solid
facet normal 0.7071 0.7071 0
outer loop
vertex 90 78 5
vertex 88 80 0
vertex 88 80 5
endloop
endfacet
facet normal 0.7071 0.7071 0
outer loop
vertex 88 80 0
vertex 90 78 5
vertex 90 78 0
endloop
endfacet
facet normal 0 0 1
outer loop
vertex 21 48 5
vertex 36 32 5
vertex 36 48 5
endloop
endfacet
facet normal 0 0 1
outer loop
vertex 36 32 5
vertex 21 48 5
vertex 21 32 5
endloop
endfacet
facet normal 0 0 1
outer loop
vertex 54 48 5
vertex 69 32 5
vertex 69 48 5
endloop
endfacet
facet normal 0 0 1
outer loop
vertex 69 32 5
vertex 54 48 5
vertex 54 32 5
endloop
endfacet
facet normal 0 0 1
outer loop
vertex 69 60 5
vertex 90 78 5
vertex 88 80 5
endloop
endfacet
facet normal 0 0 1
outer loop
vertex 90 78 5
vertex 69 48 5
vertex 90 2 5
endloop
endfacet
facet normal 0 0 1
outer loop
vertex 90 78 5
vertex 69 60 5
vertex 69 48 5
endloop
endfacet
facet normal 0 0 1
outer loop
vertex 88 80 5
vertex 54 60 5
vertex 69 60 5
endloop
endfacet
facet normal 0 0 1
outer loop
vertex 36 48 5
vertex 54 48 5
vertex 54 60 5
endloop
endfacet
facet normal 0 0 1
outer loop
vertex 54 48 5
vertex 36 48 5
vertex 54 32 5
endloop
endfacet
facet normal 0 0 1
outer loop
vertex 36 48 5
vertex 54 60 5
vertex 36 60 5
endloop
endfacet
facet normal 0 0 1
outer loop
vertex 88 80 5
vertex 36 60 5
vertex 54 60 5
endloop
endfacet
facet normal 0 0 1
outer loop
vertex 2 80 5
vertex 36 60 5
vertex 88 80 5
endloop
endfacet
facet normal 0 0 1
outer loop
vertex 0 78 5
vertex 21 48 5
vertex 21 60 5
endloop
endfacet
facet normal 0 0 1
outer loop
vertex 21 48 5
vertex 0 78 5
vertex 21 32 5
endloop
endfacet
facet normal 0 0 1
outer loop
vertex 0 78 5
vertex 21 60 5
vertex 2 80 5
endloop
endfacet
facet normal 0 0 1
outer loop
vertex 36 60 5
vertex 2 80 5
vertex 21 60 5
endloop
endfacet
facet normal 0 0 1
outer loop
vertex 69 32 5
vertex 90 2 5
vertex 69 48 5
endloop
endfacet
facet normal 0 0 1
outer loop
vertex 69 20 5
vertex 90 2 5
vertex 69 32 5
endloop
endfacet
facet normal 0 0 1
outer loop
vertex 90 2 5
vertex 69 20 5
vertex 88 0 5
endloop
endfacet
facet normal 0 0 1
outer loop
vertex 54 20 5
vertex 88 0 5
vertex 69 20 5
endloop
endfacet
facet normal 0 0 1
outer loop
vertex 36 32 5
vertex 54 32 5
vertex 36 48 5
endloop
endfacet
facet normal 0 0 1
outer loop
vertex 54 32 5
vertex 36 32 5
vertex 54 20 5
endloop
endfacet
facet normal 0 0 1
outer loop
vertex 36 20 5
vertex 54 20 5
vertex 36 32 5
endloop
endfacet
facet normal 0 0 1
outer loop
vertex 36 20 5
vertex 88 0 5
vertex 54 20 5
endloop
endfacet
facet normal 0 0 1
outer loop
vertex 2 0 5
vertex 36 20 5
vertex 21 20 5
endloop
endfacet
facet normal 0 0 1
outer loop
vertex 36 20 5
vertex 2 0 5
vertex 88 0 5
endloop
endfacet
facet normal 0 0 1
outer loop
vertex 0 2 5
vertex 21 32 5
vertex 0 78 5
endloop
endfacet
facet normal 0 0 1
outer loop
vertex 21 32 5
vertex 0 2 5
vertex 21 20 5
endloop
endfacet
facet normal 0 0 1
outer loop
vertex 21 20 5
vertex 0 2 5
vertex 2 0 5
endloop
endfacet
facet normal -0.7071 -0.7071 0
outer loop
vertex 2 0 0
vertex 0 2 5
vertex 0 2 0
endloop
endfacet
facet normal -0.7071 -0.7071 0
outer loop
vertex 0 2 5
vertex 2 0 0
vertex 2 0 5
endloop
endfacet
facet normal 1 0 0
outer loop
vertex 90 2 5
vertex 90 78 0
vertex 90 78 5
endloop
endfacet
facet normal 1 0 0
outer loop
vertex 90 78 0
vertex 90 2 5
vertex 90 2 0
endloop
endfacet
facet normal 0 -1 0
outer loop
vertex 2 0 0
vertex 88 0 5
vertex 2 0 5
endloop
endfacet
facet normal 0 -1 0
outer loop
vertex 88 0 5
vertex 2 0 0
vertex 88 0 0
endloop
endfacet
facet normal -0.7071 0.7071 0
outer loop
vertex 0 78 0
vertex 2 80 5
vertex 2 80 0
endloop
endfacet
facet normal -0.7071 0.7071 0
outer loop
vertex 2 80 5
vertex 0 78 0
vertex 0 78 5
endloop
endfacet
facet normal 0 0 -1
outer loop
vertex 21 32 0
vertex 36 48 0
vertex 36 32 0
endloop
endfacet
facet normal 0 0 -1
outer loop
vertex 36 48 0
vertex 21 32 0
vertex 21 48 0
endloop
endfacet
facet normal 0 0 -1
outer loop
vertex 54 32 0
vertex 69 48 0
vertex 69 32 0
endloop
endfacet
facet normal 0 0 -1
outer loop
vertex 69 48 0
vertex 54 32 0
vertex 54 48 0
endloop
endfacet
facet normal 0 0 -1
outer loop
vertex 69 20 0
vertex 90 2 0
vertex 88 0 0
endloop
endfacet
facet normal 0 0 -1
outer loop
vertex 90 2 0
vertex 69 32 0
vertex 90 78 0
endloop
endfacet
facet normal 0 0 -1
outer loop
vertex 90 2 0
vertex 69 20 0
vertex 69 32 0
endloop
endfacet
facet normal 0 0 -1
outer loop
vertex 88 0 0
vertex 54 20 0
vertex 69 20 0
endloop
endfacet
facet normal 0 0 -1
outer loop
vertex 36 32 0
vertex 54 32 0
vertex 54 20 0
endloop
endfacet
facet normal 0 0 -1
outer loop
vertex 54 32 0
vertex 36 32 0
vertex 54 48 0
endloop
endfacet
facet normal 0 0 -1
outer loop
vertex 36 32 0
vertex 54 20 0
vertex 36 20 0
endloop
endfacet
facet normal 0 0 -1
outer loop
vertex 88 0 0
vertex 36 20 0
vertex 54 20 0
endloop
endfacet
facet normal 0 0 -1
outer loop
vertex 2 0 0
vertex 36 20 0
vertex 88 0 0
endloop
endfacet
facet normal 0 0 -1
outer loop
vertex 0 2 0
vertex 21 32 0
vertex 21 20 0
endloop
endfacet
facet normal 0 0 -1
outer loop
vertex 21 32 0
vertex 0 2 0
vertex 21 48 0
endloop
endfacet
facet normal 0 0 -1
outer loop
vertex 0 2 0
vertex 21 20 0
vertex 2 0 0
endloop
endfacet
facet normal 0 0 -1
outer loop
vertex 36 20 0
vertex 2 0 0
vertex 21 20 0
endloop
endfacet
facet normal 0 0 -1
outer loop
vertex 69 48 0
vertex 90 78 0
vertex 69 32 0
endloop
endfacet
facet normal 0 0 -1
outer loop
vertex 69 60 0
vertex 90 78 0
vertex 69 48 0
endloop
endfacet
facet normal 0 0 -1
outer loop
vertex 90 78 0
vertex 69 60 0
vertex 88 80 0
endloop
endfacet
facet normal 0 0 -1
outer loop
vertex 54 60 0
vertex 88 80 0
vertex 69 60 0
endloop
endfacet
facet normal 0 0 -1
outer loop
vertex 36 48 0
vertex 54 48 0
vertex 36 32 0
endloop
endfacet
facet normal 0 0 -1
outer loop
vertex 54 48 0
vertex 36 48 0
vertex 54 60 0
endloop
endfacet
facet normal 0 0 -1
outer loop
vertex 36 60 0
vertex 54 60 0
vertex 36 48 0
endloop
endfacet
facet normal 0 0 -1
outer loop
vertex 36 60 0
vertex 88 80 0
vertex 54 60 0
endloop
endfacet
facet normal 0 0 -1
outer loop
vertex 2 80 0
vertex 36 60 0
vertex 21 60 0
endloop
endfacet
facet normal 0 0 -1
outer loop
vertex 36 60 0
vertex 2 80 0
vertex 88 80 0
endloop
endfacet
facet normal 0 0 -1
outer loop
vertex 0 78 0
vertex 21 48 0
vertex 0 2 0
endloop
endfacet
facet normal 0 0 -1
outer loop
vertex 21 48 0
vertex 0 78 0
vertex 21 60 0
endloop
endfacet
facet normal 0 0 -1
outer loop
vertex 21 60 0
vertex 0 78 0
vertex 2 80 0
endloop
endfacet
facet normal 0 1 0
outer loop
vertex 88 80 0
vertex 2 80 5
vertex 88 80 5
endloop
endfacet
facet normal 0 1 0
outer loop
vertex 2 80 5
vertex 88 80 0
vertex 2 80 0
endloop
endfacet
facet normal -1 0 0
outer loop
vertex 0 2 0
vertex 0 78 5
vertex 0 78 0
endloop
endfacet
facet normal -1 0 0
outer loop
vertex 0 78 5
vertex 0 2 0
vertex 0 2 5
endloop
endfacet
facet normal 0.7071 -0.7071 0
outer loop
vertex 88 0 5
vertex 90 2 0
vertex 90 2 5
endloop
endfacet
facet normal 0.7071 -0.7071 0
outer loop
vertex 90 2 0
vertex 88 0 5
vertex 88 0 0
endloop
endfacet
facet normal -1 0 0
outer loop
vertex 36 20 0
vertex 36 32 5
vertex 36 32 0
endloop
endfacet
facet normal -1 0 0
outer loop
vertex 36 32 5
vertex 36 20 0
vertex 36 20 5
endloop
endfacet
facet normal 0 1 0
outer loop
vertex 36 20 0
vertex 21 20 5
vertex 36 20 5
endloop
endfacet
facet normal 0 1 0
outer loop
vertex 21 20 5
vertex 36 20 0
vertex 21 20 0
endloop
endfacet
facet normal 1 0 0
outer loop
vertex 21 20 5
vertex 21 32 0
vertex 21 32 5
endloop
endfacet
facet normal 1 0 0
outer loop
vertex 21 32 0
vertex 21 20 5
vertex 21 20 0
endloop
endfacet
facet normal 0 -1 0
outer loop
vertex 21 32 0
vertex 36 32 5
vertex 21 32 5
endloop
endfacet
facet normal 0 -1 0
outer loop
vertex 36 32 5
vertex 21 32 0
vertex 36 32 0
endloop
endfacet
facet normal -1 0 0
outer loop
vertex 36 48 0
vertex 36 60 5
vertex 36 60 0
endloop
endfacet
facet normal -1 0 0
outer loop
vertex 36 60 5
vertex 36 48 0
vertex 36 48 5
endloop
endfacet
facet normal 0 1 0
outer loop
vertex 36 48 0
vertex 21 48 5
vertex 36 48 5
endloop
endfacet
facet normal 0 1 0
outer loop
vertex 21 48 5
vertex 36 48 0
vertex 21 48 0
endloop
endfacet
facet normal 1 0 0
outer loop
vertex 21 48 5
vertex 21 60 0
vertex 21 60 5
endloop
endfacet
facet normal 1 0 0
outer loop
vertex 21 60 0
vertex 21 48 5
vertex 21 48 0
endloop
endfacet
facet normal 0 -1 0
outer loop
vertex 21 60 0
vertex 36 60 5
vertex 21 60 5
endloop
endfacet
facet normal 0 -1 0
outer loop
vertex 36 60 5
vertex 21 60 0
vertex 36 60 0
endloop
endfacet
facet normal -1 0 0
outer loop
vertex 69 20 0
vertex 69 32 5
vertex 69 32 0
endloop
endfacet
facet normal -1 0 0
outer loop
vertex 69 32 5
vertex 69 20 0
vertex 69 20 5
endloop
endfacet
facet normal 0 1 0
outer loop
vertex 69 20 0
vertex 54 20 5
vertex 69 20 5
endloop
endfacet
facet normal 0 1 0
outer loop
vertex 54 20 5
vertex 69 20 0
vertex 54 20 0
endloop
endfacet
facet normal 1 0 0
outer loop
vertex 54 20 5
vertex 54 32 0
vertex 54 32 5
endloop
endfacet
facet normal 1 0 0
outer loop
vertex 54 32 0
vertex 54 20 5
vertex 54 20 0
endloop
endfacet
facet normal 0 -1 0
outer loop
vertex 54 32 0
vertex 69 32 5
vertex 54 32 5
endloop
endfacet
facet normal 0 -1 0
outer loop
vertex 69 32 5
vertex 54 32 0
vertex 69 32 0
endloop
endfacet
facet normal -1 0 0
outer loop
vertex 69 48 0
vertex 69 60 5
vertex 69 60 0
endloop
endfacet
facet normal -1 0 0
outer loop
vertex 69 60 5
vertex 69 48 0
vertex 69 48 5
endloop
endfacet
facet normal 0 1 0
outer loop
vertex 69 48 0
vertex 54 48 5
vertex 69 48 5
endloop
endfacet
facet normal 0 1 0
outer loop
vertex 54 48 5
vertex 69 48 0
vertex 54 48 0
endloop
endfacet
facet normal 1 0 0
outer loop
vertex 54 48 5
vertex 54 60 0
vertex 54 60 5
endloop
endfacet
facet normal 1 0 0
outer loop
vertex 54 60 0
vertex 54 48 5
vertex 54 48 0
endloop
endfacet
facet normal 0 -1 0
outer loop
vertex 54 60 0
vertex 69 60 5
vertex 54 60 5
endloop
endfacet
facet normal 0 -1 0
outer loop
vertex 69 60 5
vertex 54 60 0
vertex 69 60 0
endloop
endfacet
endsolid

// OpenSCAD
$fn = 32;

// ----------------------------------------------------------------------
// Windowed plate: 4 voids, 90 x 80 x 5 mm
// ----------------------------------------------------------------------

// --- parameters (mm) ---
plate_l = 90;             // plate length, X
plate_w = 80;             // plate width, Y
plate_t = 5;              // plate thickness, Z
edge_margin = 12;         // wall from the plate edge to any window
win_l = 15;               // pocket length
win_w = 12;               // pocket width
pitch_x = 33;             // grid pitch along X
pitch_y = 28;             // grid pitch along Y
depth_1 = 5;              // depth of void 1 (full thickness = through)
depth_2 = 5;              // depth of void 2 (full thickness = through)
depth_3 = 5;              // depth of void 3 (full thickness = through)
depth_4 = 5;              // depth of void 4 (full thickness = through)
corner_c = 2;             // corner chamfer of the plate

profile = [[2, 0], [88, 0], [90, 2], [90, 78], [88, 80], [2, 80], [0, 78], [0, 2]];  // primary outline, 8 points, counter clockwise
void_1 = [[21, 20], [36, 20], [36, 32], [21, 32]];  // pocket at grid node 0,0, 4 points
void_2 = [[21, 48], [36, 48], [36, 60], [21, 60]];  // pocket at grid node 0,1, 4 points
void_3 = [[54, 20], [69, 20], [69, 32], [54, 32]];  // pocket at grid node 1,0, 4 points
void_4 = [[54, 48], [69, 48], [69, 60], [54, 60]];  // pocket at grid node 1,1, 4 points

// --- the one profile operation ---
difference() {
  linear_extrude(height = plate_t) polygon(points = profile);
  translate([0, 0, -1])
    linear_extrude(height = plate_t + 2) polygon(points = void_1);
  translate([0, 0, -1])
    linear_extrude(height = plate_t + 2) polygon(points = void_2);
  translate([0, 0, -1])
    linear_extrude(height = plate_t + 2) polygon(points = void_3);
  translate([0, 0, -1])
    linear_extrude(height = plate_t + 2) polygon(points = void_4);
}
